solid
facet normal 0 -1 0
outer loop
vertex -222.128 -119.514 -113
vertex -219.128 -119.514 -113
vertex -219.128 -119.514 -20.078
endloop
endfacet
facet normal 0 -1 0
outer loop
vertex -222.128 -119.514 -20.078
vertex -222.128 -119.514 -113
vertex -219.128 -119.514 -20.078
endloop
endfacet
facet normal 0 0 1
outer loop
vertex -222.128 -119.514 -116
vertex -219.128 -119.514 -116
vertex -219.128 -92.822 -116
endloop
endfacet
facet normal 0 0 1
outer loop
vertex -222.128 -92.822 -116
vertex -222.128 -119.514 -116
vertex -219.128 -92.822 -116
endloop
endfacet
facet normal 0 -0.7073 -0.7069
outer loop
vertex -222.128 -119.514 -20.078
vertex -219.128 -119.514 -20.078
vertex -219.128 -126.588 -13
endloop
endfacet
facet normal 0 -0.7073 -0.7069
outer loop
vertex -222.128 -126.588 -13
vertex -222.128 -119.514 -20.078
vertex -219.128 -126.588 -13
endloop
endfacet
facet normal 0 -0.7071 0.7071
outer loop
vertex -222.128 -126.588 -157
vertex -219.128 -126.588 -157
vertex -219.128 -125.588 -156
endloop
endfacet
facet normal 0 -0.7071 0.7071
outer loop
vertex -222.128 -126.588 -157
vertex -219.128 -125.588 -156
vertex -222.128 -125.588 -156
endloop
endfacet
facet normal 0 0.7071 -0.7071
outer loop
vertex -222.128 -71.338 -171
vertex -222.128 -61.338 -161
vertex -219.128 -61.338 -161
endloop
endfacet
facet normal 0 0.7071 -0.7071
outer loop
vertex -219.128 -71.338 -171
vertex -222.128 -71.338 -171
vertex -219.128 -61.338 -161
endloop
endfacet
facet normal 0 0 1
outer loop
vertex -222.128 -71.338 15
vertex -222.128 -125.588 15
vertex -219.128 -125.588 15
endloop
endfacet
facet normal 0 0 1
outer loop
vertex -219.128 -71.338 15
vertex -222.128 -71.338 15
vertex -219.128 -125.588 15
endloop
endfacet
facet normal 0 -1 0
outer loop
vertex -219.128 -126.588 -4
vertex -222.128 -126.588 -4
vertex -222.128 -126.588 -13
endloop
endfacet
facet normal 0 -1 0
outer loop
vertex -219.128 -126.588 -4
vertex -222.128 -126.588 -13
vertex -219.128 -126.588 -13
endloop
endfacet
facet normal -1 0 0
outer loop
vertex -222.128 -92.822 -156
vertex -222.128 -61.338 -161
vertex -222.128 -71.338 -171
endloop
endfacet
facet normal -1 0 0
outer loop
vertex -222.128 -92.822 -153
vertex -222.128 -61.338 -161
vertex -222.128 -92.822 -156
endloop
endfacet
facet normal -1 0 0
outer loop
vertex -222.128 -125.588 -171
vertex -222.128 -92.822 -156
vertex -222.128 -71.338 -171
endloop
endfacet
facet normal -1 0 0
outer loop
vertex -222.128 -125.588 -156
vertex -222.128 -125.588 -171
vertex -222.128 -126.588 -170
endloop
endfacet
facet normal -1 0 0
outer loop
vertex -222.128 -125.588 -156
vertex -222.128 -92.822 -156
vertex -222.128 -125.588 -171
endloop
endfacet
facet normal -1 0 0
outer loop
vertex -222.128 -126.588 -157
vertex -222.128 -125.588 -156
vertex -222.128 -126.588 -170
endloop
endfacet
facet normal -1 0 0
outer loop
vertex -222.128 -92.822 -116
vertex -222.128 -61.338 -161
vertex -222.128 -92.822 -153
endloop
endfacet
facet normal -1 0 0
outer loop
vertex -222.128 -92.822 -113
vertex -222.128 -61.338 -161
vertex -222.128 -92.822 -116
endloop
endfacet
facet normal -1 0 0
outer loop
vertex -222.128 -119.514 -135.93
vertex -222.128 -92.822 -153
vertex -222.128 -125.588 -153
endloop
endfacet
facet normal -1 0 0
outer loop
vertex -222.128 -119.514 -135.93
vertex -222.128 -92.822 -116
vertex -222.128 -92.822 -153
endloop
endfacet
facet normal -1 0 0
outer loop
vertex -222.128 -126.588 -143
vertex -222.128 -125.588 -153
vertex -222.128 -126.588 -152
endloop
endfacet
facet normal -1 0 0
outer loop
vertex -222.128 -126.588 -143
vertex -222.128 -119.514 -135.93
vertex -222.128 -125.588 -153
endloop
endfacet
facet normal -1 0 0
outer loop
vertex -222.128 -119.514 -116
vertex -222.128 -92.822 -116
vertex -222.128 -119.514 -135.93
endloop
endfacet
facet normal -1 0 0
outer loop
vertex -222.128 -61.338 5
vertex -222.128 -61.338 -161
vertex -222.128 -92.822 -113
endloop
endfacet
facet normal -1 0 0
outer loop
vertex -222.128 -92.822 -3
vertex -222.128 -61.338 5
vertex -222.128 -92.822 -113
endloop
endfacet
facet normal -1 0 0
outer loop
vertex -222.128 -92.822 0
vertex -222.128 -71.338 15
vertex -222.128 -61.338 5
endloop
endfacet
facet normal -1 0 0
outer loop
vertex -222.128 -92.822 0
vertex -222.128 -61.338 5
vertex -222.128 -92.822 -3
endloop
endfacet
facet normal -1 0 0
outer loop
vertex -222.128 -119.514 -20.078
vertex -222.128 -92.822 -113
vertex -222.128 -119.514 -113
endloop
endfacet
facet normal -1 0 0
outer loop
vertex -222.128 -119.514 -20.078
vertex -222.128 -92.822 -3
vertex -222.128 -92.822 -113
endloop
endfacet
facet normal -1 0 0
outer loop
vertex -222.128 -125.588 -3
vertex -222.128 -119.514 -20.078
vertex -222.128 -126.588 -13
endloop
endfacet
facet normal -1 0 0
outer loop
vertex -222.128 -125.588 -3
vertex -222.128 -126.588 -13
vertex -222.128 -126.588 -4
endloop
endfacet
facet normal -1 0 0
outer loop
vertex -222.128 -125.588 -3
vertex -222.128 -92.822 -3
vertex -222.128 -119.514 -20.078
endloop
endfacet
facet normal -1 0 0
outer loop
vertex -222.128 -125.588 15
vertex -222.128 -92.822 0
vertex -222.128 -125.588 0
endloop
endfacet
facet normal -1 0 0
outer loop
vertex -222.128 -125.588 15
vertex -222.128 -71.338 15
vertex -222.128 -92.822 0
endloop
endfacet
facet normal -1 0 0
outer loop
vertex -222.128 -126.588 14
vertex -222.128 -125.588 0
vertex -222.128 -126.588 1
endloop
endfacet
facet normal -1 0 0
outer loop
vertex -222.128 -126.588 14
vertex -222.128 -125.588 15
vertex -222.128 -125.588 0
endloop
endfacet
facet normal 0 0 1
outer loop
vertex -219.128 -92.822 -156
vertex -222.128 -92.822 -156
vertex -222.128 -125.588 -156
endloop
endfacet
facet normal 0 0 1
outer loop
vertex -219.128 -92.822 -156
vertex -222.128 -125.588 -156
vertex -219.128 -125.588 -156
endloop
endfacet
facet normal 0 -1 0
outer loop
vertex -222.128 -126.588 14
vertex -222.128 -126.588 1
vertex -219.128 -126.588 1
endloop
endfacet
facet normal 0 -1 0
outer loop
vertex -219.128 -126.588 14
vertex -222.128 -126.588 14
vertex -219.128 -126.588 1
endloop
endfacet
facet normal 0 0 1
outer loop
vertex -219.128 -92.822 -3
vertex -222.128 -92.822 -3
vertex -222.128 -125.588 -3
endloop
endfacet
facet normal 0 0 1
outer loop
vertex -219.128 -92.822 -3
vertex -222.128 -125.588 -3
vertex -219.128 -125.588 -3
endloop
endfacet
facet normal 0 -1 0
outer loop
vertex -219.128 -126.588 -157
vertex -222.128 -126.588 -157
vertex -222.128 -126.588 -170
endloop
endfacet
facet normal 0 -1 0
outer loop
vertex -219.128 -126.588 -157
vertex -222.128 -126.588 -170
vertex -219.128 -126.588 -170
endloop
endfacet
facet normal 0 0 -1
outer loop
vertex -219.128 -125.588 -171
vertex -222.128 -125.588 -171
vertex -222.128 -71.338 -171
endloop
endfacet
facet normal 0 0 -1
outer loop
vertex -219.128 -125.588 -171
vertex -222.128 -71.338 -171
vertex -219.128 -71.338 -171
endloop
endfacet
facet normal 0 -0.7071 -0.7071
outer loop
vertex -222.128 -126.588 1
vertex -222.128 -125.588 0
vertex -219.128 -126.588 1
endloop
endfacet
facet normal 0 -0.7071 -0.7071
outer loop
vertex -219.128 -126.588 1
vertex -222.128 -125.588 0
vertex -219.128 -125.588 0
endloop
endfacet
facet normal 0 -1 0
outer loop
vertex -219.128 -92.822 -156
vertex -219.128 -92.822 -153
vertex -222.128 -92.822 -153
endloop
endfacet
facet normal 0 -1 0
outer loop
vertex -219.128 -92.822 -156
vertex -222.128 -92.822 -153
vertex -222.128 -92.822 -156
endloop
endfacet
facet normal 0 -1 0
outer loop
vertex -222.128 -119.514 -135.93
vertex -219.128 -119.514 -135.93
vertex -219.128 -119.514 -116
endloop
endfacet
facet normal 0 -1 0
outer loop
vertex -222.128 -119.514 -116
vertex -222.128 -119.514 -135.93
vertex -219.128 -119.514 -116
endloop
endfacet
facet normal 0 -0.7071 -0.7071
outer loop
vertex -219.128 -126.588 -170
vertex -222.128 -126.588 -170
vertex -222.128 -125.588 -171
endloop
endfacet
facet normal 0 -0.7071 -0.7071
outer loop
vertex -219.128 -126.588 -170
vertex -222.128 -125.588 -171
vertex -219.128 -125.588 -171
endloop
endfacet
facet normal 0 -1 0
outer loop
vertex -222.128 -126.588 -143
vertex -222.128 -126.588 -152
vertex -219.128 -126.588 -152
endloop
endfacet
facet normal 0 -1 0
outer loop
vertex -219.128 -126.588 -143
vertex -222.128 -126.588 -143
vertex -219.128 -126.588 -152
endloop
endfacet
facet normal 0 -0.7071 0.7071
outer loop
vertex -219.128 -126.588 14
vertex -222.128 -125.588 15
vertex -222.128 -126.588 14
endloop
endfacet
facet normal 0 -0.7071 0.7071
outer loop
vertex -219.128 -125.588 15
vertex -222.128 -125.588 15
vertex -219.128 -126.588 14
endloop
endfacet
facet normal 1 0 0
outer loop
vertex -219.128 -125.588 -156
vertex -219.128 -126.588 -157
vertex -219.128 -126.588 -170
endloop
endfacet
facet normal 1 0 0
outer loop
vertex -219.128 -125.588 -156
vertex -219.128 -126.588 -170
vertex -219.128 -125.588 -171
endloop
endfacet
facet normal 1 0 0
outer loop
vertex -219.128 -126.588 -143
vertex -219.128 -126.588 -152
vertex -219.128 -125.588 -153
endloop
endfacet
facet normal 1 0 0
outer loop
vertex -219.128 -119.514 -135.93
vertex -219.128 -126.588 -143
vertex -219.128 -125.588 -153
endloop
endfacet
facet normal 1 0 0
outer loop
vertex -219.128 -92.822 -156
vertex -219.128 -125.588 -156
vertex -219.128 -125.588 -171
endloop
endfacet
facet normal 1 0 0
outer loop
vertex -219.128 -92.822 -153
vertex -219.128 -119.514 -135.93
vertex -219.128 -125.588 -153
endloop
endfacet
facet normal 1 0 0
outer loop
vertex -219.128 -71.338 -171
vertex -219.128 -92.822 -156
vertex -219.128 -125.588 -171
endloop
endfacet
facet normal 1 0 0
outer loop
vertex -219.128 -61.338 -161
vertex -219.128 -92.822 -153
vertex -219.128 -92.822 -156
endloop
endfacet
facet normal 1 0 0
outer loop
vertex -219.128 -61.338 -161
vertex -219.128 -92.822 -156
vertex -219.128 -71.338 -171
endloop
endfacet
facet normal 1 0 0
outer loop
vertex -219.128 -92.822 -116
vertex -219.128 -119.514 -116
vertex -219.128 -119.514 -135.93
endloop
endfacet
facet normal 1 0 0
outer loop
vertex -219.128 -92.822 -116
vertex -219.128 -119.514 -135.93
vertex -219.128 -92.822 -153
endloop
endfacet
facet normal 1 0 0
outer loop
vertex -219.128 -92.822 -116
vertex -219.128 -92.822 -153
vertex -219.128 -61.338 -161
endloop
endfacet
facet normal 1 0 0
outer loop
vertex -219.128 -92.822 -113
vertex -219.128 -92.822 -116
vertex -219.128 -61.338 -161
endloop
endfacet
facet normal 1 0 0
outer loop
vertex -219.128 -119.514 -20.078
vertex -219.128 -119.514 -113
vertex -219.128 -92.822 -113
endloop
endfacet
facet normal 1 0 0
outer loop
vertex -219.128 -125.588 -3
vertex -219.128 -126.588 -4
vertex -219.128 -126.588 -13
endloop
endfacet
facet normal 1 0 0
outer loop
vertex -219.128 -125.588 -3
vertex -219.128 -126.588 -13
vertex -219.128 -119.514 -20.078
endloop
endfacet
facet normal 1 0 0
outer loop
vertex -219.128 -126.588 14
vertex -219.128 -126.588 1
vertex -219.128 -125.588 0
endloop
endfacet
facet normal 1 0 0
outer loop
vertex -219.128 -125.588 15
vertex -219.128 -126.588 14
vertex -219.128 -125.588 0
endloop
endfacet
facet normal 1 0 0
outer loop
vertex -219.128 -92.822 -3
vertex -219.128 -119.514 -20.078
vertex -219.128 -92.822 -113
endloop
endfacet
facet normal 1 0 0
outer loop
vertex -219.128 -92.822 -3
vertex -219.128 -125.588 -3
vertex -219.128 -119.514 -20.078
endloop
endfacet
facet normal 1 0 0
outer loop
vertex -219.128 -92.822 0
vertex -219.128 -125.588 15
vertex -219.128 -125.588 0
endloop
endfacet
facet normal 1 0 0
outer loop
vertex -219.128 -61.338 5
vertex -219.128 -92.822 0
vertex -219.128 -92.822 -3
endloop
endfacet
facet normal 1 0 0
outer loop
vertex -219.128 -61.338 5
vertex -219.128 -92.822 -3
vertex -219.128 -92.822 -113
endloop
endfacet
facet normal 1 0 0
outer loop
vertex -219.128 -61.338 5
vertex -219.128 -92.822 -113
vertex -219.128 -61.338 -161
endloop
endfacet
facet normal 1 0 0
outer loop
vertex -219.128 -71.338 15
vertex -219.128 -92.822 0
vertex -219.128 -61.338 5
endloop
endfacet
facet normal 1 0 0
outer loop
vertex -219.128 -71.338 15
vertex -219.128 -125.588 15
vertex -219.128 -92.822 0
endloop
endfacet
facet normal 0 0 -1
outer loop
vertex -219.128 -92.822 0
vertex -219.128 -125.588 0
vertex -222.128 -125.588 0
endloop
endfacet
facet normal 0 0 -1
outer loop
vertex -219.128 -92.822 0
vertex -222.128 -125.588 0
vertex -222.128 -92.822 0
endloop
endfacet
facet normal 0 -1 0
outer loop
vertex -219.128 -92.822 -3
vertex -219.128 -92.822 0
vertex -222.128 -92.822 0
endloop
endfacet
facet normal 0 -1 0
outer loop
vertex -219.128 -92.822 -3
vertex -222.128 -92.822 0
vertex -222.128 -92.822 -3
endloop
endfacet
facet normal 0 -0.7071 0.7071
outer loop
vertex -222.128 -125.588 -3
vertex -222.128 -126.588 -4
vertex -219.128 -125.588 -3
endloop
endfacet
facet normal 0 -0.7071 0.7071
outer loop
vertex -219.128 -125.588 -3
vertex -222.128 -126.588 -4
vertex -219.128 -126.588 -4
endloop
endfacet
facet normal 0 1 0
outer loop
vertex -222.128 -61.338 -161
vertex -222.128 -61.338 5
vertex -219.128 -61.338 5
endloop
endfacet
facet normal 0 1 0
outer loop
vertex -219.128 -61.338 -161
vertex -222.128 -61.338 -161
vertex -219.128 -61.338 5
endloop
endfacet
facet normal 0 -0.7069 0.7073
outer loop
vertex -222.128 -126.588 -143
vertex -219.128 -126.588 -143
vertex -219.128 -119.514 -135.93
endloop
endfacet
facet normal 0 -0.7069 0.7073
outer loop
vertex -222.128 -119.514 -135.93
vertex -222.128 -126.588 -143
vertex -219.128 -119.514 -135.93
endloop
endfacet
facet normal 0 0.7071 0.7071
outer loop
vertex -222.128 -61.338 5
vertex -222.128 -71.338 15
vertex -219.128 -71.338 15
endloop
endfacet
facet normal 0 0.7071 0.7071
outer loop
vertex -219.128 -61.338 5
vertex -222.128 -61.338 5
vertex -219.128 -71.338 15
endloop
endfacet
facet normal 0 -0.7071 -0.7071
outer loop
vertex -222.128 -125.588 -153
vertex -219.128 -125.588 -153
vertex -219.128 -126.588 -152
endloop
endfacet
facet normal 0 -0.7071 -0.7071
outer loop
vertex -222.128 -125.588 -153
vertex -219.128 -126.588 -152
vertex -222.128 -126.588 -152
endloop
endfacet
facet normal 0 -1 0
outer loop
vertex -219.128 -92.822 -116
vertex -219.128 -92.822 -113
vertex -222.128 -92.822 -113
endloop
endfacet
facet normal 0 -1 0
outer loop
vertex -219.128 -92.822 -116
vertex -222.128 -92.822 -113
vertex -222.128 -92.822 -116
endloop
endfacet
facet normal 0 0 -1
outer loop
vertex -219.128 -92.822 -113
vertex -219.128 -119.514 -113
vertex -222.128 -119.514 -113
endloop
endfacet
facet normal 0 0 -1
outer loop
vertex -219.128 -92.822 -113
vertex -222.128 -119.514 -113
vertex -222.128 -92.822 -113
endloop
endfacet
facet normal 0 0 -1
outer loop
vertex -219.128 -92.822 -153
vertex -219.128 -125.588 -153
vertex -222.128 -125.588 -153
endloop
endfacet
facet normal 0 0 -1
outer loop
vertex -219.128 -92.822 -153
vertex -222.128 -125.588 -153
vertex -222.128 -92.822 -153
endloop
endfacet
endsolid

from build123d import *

# Parameters (mm, degrees)
SKETCH1_W                = 3
SKETCH1_H                = 7.073755714
SKETCH1_H_2              = 58.176244286
BOSS_EXTRUDE1_DEPTH      = 15
BOSS_EXTRUDE1_DEPTH_BACK = 171
CUT_EXTRUDE1_REACH       = 5
SKETCH2_W                = 3
SKETCH2_H                = 7.071067812
SKETCH2_H_2              = 26.692349798
CHAMFER1_SIZE            = 10
SKETCH5_W                = 3
SKETCH5_H                = 3
CUT_EXTRUDE2_DEPTH       = 1.002687902
CUT_EXTRUDE3_REACH       = 2.003
SKETCH6_W                = 3
SKETCH6_H                = 3
CHAMFER2_SIZE            = 1


with BuildPart() as part:
    # Sketch1 → Boss-Extrude1 (new body, two sides)
    with BuildSketch(Plane.XY) as boss_extrude1_sk:
        with Locations((-220.627859803, -123.051259948)):
            Rectangle(SKETCH1_W, SKETCH1_H)
        with Locations((-220.627859803, -90.426259948)):
            Rectangle(SKETCH1_W, SKETCH1_H_2)
    extrude(amount=BOSS_EXTRUDE1_DEPTH)
    extrude(boss_extrude1_sk.sketch, amount=-BOSS_EXTRUDE1_DEPTH_BACK)

    # Sketch2 → Cut-Extrude1 (cut, up to next)
    with BuildSketch(Plane(origin=(-219.127859803, 0, 0), x_dir=(0, 0, -1), z_dir=(1, 0, 0)), mode=Mode.PRIVATE) as cut_extrude1_sk1:
        with Locations((1.5, -123.049915997)):
            Rectangle(SKETCH2_W, SKETCH2_H)
    cut_extrude1_tool1 = extrude(cut_extrude1_sk1.sketch, amount=-CUT_EXTRUDE1_REACH, mode=Mode.PRIVATE) & part.part
    add(cut_extrude1_tool1.solids().sort_by_distance((-219.12786, -123.049916, -1.5))[0], mode=Mode.SUBTRACT)
    # Sketch2 → Cut-Extrude1 (cut, up to next)
    with BuildSketch(Plane(origin=(-219.127859803, 0, 0), x_dir=(0, 0, -1), z_dir=(1, 0, 0)), mode=Mode.PRIVATE) as cut_extrude1_sk2:
        with Locations((1.5, -106.168207192)):
            Rectangle(SKETCH2_W, SKETCH2_H_2)
    cut_extrude1_tool2 = extrude(cut_extrude1_sk2.sketch, amount=-CUT_EXTRUDE1_REACH, mode=Mode.PRIVATE) & part.part
    add(cut_extrude1_tool2.solids().sort_by_distance((-219.12786, -106.168207, -1.5))[0], mode=Mode.SUBTRACT)
    # Sketch2 → Cut-Extrude1 (cut, up to next)
    with BuildSketch(Plane(origin=(-219.127859803, 0, 0), x_dir=(0, 0, -1), z_dir=(1, 0, 0)), mode=Mode.PRIVATE) as cut_extrude1_sk3:
        Polygon((116, -126.585449903), (113, -126.585449903), (113, -119.514382091), (20.077559088, -119.514382091), (12.999999639, -126.588137805), (143, -126.588137805), (135.930045977, -119.514382091), (116, -119.514382091), align=None)
    cut_extrude1_tool3 = extrude(cut_extrude1_sk3.sketch, amount=-CUT_EXTRUDE1_REACH, mode=Mode.PRIVATE) & part.part
    add(cut_extrude1_tool3.solids().sort_by_distance((-219.12786, -123.120833, -77.089206))[0], mode=Mode.SUBTRACT)
    # Sketch2 → Cut-Extrude1 (cut, up to next)
    with BuildSketch(Plane(origin=(-219.127859803, 0, 0), x_dir=(0, 0, -1), z_dir=(1, 0, 0)), mode=Mode.PRIVATE) as cut_extrude1_sk4:
        with Locations((114.5, -123.049915997)):
            Rectangle(SKETCH2_W, SKETCH2_H)
    cut_extrude1_tool4 = extrude(cut_extrude1_sk4.sketch, amount=-CUT_EXTRUDE1_REACH, mode=Mode.PRIVATE) & part.part
    add(cut_extrude1_tool4.solids().sort_by_distance((-219.12786, -123.049916, -114.5))[0], mode=Mode.SUBTRACT)
    # Sketch2 → Cut-Extrude1 (cut, up to next)
    with BuildSketch(Plane(origin=(-219.127859803, 0, 0), x_dir=(0, 0, -1), z_dir=(1, 0, 0)), mode=Mode.PRIVATE) as cut_extrude1_sk5:
        with Locations((114.5, -106.168207192)):
            Rectangle(SKETCH2_W, SKETCH2_H_2)
    cut_extrude1_tool5 = extrude(cut_extrude1_sk5.sketch, amount=-CUT_EXTRUDE1_REACH, mode=Mode.PRIVATE) & part.part
    add(cut_extrude1_tool5.solids().sort_by_distance((-219.12786, -106.168207, -114.5))[0], mode=Mode.SUBTRACT)
    # Sketch2 → Cut-Extrude1 (cut, up to next)
    with BuildSketch(Plane(origin=(-219.127859803, 0, 0), x_dir=(0, 0, -1), z_dir=(1, 0, 0)), mode=Mode.PRIVATE) as cut_extrude1_sk6:
        with Locations((154.5, -123.049915997)):
            Rectangle(SKETCH2_W, SKETCH2_H)
    cut_extrude1_tool6 = extrude(cut_extrude1_sk6.sketch, amount=-CUT_EXTRUDE1_REACH, mode=Mode.PRIVATE) & part.part
    add(cut_extrude1_tool6.solids().sort_by_distance((-219.12786, -123.049916, -154.5))[0], mode=Mode.SUBTRACT)
    # Sketch2 → Cut-Extrude1 (cut, up to next)
    with BuildSketch(Plane(origin=(-219.127859803, 0, 0), x_dir=(0, 0, -1), z_dir=(1, 0, 0)), mode=Mode.PRIVATE) as cut_extrude1_sk7:
        with Locations((154.5, -106.168207192)):
            Rectangle(SKETCH2_W, SKETCH2_H_2)
    cut_extrude1_tool7 = extrude(cut_extrude1_sk7.sketch, amount=-CUT_EXTRUDE1_REACH, mode=Mode.PRIVATE) & part.part
    add(cut_extrude1_tool7.solids().sort_by_distance((-219.12786, -106.168207, -154.5))[0], mode=Mode.SUBTRACT)

    # Chamfer1
    chamfer1_edges = [part.edges().sort_by_distance(p)[0] for p in [
        (-220.627859803, -61.338137805, -171),
        (-220.627859803, -61.338137805, 15),
    ]]
    chamfer(chamfer1_edges, length=CHAMFER1_SIZE)

    # Sketch5 → Cut-Extrude2 (cut, through all)
    with BuildSketch(Plane(origin=(0, -126.585449903, 0), x_dir=(1, 0, 0), z_dir=(0, 1, 0))):
        with Locations((-220.627859803, 154.5)):
            Rectangle(SKETCH5_W, SKETCH5_H)
    extrude(amount=-CUT_EXTRUDE2_DEPTH, mode=Mode.SUBTRACT)

    # Sketch6 → Cut-Extrude3 (cut, up to next)
    with BuildSketch(Plane(origin=(0, -126.585449903, 0), x_dir=(1, 0, 0), z_dir=(0, 1, 0)), mode=Mode.PRIVATE) as cut_extrude3_sk1:
        with Locations((-220.627859803, 1.5)):
            Rectangle(SKETCH6_W, SKETCH6_H)
    cut_extrude3_tool1 = extrude(cut_extrude3_sk1.sketch, amount=-CUT_EXTRUDE3_REACH, mode=Mode.PRIVATE) & part.part
    add(cut_extrude3_tool1.solids().sort_by_distance((-220.62786, -126.58545, -1.5))[0], mode=Mode.SUBTRACT)

    # Chamfer2
    chamfer2_edges = [part.edges().sort_by_distance(p)[0] for p in [
        (-220.627859803, -126.588137805, -3),
        (-220.627859803, -126.588137805, 0),
        (-220.627859803, -126.588137805, 15),
        (-220.627859803, -126.588137805, -171),
        (-220.627859803, -126.588137805, -156),
        (-220.627859803, -126.588137805, -153),
    ]]
    chamfer(chamfer2_edges, length=CHAMFER2_SIZE)


solid = part.part
